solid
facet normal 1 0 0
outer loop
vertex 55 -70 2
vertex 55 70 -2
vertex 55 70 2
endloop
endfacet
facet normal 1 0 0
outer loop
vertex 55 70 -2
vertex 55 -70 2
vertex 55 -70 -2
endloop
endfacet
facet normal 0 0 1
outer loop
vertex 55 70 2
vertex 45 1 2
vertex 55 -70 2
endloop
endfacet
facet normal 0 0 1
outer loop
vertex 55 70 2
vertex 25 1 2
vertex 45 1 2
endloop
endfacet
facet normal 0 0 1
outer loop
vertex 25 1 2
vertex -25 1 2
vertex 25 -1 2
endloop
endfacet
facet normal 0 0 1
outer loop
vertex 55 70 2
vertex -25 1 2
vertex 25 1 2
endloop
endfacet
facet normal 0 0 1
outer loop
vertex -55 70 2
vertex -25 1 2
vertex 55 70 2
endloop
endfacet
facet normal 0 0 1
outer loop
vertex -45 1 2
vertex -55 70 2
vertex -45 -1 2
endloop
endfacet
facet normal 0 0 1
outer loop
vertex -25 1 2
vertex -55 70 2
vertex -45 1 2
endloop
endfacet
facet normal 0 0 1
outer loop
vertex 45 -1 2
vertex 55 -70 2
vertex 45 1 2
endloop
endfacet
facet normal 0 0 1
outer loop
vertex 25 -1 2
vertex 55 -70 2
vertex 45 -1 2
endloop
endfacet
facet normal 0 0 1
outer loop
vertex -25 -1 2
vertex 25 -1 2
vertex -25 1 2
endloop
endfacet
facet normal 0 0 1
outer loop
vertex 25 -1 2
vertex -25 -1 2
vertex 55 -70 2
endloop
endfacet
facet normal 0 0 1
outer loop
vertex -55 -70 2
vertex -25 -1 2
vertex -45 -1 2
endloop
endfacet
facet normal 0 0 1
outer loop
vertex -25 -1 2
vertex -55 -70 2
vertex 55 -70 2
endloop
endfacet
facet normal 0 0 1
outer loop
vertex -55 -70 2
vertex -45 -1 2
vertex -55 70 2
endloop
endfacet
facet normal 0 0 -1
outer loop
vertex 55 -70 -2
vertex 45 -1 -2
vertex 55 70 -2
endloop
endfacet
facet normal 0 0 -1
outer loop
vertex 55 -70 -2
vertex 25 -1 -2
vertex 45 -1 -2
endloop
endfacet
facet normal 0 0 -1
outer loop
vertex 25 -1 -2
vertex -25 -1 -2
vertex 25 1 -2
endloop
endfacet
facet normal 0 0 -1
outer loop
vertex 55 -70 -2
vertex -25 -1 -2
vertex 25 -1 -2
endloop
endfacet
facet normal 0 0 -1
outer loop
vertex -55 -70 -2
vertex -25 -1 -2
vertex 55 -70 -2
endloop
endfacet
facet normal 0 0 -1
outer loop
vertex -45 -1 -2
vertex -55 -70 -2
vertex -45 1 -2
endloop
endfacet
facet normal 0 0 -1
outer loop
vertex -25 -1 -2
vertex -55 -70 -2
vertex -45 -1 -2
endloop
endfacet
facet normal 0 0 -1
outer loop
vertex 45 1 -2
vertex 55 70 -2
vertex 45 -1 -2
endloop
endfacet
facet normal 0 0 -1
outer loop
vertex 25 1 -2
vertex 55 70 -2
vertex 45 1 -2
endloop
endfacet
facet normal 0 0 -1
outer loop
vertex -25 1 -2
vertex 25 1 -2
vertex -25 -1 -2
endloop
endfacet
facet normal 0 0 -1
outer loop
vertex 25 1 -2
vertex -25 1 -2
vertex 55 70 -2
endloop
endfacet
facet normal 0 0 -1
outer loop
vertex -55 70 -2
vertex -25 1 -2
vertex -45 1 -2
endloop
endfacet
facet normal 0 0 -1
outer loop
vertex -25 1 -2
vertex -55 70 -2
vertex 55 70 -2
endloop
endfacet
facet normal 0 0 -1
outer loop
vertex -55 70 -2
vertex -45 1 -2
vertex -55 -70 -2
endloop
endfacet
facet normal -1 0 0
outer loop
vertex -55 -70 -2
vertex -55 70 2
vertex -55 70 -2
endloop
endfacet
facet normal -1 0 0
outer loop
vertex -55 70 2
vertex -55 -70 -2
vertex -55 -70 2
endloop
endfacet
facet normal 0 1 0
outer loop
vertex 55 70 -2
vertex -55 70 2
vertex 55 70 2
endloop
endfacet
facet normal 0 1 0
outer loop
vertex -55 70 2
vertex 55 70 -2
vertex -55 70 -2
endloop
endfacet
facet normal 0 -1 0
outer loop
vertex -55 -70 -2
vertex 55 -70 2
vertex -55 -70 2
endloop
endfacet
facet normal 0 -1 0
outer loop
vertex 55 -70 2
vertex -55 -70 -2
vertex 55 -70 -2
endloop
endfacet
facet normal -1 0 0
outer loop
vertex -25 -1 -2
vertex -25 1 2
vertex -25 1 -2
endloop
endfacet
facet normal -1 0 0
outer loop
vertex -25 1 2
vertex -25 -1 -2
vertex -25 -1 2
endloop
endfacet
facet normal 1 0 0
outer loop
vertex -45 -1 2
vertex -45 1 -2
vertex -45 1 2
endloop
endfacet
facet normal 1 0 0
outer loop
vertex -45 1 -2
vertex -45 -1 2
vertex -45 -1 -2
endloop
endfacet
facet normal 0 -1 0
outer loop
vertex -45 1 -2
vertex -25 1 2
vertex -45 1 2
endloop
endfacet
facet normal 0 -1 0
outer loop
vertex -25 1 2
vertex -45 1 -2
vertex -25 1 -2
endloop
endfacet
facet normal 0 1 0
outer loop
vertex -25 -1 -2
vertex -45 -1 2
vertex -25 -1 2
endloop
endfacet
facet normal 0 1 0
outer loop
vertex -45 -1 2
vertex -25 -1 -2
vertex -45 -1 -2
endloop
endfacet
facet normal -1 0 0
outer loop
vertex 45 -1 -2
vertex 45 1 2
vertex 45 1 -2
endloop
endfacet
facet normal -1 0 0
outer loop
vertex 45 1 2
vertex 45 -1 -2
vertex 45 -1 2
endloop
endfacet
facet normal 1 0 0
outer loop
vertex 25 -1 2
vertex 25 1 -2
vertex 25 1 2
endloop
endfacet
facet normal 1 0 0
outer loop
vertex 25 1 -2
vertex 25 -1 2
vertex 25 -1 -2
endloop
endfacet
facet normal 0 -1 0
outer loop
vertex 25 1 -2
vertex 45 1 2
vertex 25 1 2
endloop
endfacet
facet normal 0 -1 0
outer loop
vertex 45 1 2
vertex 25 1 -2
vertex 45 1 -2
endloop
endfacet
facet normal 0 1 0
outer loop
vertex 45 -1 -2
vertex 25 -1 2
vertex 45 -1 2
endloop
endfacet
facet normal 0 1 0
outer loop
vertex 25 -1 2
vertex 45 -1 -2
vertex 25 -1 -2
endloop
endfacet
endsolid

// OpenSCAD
// ========================================
// a 110 x 140 x 4 mm plate with two 20 x 2 mm slots
// NeuroCAD canonical IR; dimensions are millimetres
// ========================================
$fn = 48;

difference() {
  cube(size=[110, 140, 4], center=true);
  translate([-35, 0, 0]) {
    cube(size=[20, 2, 6], center=true);
  }
  translate([35, 0, 0]) {
    cube(size=[20, 2, 6], center=true);
  }
}
